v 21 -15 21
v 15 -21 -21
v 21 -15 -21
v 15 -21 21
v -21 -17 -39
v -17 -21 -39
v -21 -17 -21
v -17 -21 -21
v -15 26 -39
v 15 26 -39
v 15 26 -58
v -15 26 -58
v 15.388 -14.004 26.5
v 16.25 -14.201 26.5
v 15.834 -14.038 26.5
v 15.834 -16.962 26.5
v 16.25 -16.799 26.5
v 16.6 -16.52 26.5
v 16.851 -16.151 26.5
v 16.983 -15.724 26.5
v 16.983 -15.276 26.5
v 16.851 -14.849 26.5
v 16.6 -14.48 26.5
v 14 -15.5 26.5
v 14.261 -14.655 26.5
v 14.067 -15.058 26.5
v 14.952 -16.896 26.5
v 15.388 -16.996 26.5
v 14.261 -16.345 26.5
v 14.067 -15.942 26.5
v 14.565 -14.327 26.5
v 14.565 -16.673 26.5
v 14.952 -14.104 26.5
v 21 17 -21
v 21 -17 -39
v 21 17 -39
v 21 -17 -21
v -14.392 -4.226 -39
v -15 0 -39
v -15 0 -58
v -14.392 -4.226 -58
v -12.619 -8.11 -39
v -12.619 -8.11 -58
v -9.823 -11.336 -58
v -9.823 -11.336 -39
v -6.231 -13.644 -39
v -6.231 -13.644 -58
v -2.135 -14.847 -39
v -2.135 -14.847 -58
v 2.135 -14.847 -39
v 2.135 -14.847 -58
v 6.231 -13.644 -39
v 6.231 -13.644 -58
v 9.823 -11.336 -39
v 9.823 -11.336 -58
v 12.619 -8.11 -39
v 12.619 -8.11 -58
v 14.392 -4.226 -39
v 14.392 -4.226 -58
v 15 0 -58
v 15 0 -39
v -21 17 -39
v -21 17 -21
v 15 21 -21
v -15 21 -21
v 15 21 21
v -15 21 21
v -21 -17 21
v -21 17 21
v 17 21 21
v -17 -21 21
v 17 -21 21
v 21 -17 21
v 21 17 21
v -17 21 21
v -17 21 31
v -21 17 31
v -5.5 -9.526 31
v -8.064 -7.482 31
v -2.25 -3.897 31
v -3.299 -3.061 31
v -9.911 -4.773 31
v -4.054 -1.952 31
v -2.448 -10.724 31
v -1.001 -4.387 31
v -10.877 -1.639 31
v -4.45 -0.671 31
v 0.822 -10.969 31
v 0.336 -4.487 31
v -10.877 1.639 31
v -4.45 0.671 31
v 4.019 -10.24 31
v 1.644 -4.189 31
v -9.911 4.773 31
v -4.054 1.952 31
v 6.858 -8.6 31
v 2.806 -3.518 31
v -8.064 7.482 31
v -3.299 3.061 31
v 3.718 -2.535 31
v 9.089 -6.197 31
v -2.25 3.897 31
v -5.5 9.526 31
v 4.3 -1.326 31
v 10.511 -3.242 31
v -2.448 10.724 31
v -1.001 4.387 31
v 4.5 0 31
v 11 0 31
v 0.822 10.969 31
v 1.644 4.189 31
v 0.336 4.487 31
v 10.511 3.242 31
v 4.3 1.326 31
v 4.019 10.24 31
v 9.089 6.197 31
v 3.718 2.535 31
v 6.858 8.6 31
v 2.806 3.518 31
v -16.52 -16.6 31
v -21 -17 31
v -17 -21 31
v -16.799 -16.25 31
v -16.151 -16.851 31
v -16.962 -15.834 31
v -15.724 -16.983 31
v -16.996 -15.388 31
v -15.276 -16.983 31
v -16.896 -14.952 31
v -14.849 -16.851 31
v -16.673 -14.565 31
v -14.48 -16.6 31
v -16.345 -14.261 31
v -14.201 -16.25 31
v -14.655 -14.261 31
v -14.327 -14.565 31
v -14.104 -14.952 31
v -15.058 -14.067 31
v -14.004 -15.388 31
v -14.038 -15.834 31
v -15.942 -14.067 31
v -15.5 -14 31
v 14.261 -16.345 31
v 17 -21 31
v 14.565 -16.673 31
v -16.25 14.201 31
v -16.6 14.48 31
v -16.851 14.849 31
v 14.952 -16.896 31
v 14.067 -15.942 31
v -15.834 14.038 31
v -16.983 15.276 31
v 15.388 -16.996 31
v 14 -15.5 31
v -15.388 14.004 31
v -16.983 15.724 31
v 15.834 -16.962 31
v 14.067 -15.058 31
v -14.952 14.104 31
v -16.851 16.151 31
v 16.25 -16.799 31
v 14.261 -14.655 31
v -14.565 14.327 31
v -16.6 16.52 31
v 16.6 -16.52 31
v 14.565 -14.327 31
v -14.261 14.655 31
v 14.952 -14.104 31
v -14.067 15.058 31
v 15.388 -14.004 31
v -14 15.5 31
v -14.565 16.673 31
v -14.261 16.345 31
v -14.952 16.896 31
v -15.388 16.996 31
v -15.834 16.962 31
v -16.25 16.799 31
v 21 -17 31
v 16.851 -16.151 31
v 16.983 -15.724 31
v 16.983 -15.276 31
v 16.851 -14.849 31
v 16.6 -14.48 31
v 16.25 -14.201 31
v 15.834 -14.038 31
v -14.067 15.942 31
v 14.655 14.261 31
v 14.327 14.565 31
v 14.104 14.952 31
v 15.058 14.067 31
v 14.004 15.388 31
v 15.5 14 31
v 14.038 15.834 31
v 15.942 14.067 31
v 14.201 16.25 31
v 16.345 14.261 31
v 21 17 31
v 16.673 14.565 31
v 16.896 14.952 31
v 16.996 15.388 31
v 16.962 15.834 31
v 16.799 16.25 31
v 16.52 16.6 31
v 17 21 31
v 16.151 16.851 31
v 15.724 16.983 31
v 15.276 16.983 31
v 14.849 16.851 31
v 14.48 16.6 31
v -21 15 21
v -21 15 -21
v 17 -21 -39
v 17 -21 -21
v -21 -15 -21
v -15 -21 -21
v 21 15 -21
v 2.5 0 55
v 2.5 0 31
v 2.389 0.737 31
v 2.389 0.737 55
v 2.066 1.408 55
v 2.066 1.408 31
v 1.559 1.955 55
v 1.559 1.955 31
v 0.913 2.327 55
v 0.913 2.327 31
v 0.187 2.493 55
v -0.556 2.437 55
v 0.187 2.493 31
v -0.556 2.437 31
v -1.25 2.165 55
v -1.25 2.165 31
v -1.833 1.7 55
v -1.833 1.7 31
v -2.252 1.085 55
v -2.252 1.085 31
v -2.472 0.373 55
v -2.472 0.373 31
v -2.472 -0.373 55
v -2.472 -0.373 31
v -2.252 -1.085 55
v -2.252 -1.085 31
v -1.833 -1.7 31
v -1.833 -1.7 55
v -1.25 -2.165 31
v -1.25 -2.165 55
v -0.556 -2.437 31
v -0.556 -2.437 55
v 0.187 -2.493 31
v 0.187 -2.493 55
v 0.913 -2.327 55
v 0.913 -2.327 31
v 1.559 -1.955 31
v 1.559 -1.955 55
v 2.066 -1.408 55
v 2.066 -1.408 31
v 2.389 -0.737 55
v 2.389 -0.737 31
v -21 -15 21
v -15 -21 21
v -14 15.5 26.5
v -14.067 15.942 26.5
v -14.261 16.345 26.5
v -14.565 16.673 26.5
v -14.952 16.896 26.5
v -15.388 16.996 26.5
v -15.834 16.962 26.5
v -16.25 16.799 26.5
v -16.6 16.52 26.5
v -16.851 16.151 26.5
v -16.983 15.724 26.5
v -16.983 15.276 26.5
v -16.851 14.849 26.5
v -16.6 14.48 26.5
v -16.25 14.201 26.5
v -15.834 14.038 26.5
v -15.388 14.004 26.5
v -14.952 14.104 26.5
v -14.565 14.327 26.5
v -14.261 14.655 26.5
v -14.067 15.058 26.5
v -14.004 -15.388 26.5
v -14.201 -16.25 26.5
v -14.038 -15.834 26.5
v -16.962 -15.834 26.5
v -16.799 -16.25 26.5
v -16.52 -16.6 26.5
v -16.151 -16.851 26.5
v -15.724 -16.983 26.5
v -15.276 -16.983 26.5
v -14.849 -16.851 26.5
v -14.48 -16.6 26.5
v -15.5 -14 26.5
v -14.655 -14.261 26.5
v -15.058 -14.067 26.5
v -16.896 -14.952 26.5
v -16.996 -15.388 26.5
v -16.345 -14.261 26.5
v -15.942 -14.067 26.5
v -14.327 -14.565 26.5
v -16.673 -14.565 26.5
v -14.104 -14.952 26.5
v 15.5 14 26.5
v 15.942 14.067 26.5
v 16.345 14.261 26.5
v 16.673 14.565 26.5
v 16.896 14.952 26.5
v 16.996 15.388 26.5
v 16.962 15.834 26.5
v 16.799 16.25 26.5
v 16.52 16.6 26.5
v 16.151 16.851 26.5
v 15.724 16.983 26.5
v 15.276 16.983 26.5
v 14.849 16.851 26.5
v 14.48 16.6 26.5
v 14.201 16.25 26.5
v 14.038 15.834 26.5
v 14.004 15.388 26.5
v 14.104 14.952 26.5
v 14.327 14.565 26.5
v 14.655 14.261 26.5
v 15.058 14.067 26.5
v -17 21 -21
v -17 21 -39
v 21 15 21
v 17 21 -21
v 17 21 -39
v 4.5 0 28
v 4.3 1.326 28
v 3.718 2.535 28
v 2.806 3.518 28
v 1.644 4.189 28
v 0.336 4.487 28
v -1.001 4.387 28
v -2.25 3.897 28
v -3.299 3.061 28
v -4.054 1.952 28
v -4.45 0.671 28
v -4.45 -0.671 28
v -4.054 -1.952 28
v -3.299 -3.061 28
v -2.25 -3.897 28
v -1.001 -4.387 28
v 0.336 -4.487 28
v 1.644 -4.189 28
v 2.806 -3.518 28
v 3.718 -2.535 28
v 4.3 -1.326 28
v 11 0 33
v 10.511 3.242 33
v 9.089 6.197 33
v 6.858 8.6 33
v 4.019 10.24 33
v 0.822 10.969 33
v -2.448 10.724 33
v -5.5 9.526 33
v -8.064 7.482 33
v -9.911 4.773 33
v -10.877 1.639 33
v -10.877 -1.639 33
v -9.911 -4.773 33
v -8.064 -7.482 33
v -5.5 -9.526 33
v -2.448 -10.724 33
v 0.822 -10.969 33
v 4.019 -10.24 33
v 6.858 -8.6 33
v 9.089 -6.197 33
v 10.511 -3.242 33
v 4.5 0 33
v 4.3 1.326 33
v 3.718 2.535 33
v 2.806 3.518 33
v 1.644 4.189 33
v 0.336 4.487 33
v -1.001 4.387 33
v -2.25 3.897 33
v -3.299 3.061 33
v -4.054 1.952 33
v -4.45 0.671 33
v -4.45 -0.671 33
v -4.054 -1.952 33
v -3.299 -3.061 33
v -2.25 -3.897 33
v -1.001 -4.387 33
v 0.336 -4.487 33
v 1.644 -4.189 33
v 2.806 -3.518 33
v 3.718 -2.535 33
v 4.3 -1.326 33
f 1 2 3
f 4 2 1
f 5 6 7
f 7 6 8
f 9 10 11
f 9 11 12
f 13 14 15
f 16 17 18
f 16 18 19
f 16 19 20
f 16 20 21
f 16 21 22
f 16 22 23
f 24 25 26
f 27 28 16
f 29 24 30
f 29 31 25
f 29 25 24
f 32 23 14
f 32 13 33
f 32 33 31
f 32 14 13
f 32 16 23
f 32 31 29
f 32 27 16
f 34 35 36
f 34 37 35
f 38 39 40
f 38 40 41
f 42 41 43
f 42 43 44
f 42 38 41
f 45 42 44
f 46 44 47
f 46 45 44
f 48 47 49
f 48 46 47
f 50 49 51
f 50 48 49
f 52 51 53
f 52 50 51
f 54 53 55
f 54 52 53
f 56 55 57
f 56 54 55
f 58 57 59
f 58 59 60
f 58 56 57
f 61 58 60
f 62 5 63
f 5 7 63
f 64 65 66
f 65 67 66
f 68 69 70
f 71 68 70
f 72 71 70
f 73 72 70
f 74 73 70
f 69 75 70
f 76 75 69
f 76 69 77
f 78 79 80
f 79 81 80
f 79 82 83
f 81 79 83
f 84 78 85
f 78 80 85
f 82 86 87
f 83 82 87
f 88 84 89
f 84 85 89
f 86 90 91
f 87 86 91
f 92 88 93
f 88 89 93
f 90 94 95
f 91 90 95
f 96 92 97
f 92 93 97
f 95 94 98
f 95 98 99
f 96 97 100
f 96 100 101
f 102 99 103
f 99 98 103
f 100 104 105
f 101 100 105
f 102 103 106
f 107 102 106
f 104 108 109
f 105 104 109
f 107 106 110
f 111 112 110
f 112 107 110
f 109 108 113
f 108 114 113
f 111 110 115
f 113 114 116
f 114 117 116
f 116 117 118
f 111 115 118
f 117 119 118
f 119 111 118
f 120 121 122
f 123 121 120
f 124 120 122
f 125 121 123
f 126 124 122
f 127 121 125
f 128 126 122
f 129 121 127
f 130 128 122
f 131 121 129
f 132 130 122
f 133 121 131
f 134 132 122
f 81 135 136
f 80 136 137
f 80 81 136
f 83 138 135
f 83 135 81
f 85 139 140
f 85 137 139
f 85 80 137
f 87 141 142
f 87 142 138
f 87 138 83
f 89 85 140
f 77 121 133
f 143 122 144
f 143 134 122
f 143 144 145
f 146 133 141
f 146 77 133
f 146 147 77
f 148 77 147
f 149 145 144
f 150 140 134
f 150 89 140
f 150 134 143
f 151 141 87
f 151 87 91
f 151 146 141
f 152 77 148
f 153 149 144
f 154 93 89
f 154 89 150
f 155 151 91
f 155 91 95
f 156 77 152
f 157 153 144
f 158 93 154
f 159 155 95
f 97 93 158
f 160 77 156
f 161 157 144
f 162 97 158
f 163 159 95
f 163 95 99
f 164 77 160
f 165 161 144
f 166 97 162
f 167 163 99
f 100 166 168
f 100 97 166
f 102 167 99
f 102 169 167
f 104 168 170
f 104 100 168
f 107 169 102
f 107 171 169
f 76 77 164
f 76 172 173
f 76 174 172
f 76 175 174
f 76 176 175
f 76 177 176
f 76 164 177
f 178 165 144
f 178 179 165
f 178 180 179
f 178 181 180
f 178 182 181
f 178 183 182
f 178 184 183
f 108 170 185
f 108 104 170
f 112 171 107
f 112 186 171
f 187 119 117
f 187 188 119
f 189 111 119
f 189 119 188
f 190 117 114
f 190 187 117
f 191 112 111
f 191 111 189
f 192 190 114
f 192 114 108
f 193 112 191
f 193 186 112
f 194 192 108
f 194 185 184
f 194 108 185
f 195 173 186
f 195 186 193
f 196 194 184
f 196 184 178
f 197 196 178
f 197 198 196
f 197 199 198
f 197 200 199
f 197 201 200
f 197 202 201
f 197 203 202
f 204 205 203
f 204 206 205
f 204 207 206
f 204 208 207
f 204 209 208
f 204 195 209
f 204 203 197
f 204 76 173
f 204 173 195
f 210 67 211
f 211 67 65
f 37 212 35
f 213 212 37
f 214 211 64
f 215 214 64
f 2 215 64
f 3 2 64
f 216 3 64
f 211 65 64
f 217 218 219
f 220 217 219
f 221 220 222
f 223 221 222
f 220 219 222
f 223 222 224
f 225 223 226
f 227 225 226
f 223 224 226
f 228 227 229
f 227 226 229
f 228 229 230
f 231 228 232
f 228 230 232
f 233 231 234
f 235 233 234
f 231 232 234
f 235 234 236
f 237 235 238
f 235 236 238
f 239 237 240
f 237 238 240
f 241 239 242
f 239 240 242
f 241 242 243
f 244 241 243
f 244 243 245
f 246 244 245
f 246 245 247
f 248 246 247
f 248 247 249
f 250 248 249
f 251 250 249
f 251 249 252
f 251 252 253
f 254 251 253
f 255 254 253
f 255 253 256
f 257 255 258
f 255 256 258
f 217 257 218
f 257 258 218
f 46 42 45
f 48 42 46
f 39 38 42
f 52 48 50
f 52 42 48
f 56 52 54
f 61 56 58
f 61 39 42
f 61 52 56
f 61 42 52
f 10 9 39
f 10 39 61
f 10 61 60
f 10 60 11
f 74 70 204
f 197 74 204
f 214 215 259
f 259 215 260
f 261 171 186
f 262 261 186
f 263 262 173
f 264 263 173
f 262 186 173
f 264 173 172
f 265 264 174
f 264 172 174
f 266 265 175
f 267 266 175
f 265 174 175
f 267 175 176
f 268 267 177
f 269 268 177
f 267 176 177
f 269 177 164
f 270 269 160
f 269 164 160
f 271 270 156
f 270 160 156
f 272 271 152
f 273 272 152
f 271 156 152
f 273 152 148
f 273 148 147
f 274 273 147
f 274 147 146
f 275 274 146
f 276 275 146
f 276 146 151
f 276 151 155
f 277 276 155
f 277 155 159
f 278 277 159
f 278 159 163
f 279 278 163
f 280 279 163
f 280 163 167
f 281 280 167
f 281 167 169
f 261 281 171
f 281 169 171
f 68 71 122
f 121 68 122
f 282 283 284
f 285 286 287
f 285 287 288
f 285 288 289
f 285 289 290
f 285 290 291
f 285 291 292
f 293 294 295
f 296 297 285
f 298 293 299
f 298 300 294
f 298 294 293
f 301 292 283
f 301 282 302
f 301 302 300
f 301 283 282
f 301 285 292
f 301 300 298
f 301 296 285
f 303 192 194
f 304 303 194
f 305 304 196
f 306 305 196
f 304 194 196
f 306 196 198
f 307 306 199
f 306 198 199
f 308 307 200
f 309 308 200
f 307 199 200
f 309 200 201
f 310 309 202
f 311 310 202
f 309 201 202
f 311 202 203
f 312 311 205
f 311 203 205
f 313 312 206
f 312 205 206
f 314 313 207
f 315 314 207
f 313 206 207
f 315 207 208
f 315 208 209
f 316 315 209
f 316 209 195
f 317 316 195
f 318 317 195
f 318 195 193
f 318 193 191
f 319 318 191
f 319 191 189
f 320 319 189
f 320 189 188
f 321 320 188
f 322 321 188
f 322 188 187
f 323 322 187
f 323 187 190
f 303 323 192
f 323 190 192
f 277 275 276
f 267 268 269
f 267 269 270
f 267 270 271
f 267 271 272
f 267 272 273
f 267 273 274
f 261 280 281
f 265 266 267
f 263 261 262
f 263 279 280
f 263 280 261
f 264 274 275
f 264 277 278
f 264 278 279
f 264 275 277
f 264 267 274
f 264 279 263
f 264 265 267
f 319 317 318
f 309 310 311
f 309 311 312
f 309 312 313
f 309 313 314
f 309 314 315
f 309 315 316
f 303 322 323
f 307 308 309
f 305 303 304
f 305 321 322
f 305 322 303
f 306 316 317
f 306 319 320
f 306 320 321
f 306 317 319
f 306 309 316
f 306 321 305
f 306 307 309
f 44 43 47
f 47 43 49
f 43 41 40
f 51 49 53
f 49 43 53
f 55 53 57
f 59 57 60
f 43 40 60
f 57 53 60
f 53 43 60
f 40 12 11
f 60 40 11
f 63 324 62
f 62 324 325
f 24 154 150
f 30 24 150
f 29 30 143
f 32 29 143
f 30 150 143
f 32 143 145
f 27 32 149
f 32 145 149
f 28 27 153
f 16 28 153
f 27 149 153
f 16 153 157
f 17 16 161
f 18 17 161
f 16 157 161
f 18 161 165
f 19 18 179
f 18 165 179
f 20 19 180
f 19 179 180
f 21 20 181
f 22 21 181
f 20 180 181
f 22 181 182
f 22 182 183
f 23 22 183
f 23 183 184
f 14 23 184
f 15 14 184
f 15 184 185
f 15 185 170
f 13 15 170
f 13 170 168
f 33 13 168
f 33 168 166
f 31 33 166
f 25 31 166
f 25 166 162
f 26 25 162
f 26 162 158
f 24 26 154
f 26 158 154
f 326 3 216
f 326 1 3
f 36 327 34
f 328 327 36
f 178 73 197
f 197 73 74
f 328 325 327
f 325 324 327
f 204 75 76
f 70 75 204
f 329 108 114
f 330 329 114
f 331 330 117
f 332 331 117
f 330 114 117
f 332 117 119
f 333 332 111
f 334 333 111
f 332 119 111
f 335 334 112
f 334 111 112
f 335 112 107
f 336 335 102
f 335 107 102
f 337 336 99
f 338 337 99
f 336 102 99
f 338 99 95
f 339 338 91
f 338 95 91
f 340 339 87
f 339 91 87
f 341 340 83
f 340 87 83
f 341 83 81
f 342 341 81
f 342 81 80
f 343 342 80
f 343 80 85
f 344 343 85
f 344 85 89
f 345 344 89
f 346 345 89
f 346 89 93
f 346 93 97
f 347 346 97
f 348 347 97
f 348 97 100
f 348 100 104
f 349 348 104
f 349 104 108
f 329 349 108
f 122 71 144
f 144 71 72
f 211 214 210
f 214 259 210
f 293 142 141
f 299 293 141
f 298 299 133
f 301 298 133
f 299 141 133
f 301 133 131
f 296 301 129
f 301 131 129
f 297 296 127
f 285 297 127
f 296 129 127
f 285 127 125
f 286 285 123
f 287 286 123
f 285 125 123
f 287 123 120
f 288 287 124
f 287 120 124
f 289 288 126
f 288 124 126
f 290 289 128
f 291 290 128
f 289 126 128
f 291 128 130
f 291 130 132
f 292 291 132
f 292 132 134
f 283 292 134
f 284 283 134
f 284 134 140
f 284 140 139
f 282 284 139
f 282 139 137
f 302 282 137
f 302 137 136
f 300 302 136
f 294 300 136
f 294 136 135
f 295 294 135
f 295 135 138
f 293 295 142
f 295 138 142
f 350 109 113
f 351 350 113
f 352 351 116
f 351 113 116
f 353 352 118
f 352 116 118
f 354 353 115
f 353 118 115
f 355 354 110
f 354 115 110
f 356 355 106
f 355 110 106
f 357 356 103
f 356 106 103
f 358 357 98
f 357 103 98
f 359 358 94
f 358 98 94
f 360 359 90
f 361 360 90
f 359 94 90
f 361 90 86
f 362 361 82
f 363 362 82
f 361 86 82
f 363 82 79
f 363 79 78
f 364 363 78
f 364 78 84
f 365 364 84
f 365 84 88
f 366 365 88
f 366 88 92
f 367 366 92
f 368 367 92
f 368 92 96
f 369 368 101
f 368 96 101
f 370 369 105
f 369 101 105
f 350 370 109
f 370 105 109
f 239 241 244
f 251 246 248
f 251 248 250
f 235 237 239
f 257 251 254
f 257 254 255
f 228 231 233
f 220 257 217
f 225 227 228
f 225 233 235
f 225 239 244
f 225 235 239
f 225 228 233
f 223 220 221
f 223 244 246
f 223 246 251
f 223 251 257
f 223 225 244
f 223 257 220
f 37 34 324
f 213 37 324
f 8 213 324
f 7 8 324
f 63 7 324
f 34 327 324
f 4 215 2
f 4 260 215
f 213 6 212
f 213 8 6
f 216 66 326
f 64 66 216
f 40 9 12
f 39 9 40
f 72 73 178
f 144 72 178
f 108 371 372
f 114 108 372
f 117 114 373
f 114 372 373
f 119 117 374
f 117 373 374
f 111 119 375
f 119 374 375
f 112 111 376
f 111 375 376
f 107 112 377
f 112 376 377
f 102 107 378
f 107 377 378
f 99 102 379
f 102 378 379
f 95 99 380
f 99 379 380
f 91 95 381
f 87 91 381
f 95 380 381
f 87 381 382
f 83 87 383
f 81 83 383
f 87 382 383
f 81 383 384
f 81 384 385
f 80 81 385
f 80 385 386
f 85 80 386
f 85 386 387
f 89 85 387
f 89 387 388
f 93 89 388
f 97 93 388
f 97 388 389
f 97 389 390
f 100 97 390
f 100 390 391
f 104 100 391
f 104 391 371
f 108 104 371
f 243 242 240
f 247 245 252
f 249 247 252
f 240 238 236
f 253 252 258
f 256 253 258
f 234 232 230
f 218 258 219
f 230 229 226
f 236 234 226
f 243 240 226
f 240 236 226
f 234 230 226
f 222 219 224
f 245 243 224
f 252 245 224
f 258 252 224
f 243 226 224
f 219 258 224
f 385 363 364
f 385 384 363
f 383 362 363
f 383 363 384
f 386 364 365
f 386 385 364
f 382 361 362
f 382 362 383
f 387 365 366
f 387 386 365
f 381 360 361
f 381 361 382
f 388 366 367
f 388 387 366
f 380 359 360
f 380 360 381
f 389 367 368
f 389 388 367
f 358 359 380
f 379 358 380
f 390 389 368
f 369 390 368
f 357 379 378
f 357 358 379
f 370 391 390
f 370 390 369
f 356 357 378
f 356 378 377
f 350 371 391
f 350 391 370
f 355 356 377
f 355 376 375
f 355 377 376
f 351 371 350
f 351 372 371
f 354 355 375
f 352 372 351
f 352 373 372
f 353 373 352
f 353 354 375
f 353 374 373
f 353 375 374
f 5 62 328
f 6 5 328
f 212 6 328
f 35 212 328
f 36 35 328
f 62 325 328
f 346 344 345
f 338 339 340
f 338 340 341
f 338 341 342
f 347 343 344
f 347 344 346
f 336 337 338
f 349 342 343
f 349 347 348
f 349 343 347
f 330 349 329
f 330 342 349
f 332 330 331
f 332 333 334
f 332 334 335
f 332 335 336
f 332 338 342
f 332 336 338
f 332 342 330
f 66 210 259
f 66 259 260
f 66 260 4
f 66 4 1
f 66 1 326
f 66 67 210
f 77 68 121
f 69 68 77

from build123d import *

# Parameters (mm, degrees)
SKETCH_1_W               = 42
SKETCH_1_H               = 42
EXTRUDE_1_DEPTH          = 21
CHAMFER_1_SIZE           = 6
SKETCH_15_W              = 42
SKETCH_15_H              = 42
EXTRUDE_11_DEPTH         = 10
SKETCH_16_W              = 42
SKETCH_16_H              = 42
EXTRUDE_12_DEPTH         = 8.5
SKETCH_17_W              = 42
SKETCH_17_H              = 42
EXTRUDE_13_DEPTH         = 9.5
CHAMFER_2_SIZE           = 4
CHAMFER_3_SIZE           = 4
SKETCH_2_R               = 11
EXTRUDE_2_DEPTH          = 2
SKETCH_3_R               = 4.5
CUT_EXTRUDE_1_DEPTH      = 5
SKETCH_6_R               = 2.5
EXTRUDE_9_DEPTH          = 24
EXTRUDE_10_DEPTH         = 19
SKETCH_8_R               = 1.5
CUT_EXTRUDE_3_DEPTH      = 4.5
PATTERN_CIRCULAR_1_COUNT = 4


with BuildPart() as part:
    # 草圖1 → 填料-伸長1 (new body, symmetric)
    with BuildSketch(Plane.XY):
        Rectangle(SKETCH_1_W, SKETCH_1_H)
    extrude(amount=EXTRUDE_1_DEPTH, both=True)

    # 導角1
    chamfer_1_edges = [part.edges().sort_by_distance(p)[0] for p in [
        (21, -21, 0),
        (-21, -21, 0),
        (-21, 21, 0),
        (21, 21, 0),
    ]]
    chamfer(chamfer_1_edges, length=CHAMFER_1_SIZE)


with BuildPart() as body_2:
    # 草圖15 → 填料-伸長11 (new body)
    with BuildSketch(Plane.XY.offset(21)):
        Rectangle(SKETCH_15_W, SKETCH_15_H)
    extrude(amount=EXTRUDE_11_DEPTH)

    # 導角2
    chamfer_2_edges = [body_2.edges().sort_by_distance(p)[0] for p in [
        (21, -21, 26),
        (-21, -21, 26),
        (-21, 21, 26),
        (21, 21, 26),
    ]]
    chamfer(chamfer_2_edges, length=CHAMFER_2_SIZE)


with BuildPart() as body_3:
    # 草圖16 → 填料-伸長12 (new body)
    with BuildSketch(Plane(origin=(0, 0, -21), x_dir=(-1, 0, 0), z_dir=(0, 0, -1))):
        Rectangle(SKETCH_16_W, SKETCH_16_H)
    extrude(amount=EXTRUDE_12_DEPTH)

    # 草圖17 → 填料-伸長13 (add)
    with BuildSketch(Plane.XY.offset(-29.5)):
        Rectangle(SKETCH_17_W, SKETCH_17_H)
    extrude(amount=-EXTRUDE_13_DEPTH)

    # 導角3
    chamfer_3_edges = [body_3.edges().sort_by_distance(p)[0] for p in [
        (-21, -21, -30),
        (21, -21, -30),
        (21, 21, -30),
        (-21, 21, -30),
    ]]
    chamfer(chamfer_3_edges, length=CHAMFER_3_SIZE)


with BuildPart() as body_4:
    # 草圖2 → 填料-伸長2 (new body)
    with BuildSketch(Plane.XY.offset(31)):
        Circle(SKETCH_2_R)
    extrude(amount=EXTRUDE_2_DEPTH)


with BuildPart() as cut_extrude_1_tool:
    # 草圖3 → 除料-伸長1 (new body)
    with BuildSketch(Plane.XY.offset(33)):
        Circle(SKETCH_3_R)
    extrude(amount=-CUT_EXTRUDE_1_DEPTH)


with BuildPart() as body_2_1:
    add(body_2.part)

    # 除料-伸長1: cut by cut_extrude_1_tool
    add(cut_extrude_1_tool.part, mode=Mode.SUBTRACT)

    # 草圖8 → 除料-伸長3 (cut)
    with BuildSketch(Plane.XY.offset(31)):
        with Locations((-15.5, 15.5)):
            Circle(SKETCH_8_R)
    cut_extrude_3 = extrude(amount=-CUT_EXTRUDE_3_DEPTH, mode=Mode.SUBTRACT)

    # 環狀複製排列1: 除料-伸長3 ×4 about axis
    pattern_circular_1_axis = Axis((0, 0, 0), (0, 0, 1))
    for i in range(1, PATTERN_CIRCULAR_1_COUNT):
        add(cut_extrude_3.rotate(pattern_circular_1_axis, i * 360 / PATTERN_CIRCULAR_1_COUNT), mode=Mode.SUBTRACT)


with BuildPart() as body_4_1:
    add(body_4.part)

    # 除料-伸長1: cut by cut_extrude_1_tool
    add(cut_extrude_1_tool.part, mode=Mode.SUBTRACT)


with BuildPart() as body_5:
    # 草圖6 → 填料-伸長9 (new body)
    with BuildSketch(Plane.XY.offset(31)):
        Circle(SKETCH_6_R)
    extrude(amount=EXTRUDE_9_DEPTH)


with BuildPart() as body_6:
    # 草圖9 → 填料-伸長10 (new body)
    with BuildSketch(Plane(origin=(0, 0, -39), x_dir=(-1, 0, 0), z_dir=(0, 0, -1))):
        with BuildLine():
            Line((-15, 0), (-15, 26))
            Line((-15, 26), (15, 26))
            Line((15, 26), (15, 0))
            ThreePointArc((15, 0), (0, -15), (-15, 0))
        make_face()
    extrude(amount=EXTRUDE_10_DEPTH)


solid = Compound([part.part, body_3.part, body_2_1.part, body_4_1.part, body_5.part, body_6.part])
